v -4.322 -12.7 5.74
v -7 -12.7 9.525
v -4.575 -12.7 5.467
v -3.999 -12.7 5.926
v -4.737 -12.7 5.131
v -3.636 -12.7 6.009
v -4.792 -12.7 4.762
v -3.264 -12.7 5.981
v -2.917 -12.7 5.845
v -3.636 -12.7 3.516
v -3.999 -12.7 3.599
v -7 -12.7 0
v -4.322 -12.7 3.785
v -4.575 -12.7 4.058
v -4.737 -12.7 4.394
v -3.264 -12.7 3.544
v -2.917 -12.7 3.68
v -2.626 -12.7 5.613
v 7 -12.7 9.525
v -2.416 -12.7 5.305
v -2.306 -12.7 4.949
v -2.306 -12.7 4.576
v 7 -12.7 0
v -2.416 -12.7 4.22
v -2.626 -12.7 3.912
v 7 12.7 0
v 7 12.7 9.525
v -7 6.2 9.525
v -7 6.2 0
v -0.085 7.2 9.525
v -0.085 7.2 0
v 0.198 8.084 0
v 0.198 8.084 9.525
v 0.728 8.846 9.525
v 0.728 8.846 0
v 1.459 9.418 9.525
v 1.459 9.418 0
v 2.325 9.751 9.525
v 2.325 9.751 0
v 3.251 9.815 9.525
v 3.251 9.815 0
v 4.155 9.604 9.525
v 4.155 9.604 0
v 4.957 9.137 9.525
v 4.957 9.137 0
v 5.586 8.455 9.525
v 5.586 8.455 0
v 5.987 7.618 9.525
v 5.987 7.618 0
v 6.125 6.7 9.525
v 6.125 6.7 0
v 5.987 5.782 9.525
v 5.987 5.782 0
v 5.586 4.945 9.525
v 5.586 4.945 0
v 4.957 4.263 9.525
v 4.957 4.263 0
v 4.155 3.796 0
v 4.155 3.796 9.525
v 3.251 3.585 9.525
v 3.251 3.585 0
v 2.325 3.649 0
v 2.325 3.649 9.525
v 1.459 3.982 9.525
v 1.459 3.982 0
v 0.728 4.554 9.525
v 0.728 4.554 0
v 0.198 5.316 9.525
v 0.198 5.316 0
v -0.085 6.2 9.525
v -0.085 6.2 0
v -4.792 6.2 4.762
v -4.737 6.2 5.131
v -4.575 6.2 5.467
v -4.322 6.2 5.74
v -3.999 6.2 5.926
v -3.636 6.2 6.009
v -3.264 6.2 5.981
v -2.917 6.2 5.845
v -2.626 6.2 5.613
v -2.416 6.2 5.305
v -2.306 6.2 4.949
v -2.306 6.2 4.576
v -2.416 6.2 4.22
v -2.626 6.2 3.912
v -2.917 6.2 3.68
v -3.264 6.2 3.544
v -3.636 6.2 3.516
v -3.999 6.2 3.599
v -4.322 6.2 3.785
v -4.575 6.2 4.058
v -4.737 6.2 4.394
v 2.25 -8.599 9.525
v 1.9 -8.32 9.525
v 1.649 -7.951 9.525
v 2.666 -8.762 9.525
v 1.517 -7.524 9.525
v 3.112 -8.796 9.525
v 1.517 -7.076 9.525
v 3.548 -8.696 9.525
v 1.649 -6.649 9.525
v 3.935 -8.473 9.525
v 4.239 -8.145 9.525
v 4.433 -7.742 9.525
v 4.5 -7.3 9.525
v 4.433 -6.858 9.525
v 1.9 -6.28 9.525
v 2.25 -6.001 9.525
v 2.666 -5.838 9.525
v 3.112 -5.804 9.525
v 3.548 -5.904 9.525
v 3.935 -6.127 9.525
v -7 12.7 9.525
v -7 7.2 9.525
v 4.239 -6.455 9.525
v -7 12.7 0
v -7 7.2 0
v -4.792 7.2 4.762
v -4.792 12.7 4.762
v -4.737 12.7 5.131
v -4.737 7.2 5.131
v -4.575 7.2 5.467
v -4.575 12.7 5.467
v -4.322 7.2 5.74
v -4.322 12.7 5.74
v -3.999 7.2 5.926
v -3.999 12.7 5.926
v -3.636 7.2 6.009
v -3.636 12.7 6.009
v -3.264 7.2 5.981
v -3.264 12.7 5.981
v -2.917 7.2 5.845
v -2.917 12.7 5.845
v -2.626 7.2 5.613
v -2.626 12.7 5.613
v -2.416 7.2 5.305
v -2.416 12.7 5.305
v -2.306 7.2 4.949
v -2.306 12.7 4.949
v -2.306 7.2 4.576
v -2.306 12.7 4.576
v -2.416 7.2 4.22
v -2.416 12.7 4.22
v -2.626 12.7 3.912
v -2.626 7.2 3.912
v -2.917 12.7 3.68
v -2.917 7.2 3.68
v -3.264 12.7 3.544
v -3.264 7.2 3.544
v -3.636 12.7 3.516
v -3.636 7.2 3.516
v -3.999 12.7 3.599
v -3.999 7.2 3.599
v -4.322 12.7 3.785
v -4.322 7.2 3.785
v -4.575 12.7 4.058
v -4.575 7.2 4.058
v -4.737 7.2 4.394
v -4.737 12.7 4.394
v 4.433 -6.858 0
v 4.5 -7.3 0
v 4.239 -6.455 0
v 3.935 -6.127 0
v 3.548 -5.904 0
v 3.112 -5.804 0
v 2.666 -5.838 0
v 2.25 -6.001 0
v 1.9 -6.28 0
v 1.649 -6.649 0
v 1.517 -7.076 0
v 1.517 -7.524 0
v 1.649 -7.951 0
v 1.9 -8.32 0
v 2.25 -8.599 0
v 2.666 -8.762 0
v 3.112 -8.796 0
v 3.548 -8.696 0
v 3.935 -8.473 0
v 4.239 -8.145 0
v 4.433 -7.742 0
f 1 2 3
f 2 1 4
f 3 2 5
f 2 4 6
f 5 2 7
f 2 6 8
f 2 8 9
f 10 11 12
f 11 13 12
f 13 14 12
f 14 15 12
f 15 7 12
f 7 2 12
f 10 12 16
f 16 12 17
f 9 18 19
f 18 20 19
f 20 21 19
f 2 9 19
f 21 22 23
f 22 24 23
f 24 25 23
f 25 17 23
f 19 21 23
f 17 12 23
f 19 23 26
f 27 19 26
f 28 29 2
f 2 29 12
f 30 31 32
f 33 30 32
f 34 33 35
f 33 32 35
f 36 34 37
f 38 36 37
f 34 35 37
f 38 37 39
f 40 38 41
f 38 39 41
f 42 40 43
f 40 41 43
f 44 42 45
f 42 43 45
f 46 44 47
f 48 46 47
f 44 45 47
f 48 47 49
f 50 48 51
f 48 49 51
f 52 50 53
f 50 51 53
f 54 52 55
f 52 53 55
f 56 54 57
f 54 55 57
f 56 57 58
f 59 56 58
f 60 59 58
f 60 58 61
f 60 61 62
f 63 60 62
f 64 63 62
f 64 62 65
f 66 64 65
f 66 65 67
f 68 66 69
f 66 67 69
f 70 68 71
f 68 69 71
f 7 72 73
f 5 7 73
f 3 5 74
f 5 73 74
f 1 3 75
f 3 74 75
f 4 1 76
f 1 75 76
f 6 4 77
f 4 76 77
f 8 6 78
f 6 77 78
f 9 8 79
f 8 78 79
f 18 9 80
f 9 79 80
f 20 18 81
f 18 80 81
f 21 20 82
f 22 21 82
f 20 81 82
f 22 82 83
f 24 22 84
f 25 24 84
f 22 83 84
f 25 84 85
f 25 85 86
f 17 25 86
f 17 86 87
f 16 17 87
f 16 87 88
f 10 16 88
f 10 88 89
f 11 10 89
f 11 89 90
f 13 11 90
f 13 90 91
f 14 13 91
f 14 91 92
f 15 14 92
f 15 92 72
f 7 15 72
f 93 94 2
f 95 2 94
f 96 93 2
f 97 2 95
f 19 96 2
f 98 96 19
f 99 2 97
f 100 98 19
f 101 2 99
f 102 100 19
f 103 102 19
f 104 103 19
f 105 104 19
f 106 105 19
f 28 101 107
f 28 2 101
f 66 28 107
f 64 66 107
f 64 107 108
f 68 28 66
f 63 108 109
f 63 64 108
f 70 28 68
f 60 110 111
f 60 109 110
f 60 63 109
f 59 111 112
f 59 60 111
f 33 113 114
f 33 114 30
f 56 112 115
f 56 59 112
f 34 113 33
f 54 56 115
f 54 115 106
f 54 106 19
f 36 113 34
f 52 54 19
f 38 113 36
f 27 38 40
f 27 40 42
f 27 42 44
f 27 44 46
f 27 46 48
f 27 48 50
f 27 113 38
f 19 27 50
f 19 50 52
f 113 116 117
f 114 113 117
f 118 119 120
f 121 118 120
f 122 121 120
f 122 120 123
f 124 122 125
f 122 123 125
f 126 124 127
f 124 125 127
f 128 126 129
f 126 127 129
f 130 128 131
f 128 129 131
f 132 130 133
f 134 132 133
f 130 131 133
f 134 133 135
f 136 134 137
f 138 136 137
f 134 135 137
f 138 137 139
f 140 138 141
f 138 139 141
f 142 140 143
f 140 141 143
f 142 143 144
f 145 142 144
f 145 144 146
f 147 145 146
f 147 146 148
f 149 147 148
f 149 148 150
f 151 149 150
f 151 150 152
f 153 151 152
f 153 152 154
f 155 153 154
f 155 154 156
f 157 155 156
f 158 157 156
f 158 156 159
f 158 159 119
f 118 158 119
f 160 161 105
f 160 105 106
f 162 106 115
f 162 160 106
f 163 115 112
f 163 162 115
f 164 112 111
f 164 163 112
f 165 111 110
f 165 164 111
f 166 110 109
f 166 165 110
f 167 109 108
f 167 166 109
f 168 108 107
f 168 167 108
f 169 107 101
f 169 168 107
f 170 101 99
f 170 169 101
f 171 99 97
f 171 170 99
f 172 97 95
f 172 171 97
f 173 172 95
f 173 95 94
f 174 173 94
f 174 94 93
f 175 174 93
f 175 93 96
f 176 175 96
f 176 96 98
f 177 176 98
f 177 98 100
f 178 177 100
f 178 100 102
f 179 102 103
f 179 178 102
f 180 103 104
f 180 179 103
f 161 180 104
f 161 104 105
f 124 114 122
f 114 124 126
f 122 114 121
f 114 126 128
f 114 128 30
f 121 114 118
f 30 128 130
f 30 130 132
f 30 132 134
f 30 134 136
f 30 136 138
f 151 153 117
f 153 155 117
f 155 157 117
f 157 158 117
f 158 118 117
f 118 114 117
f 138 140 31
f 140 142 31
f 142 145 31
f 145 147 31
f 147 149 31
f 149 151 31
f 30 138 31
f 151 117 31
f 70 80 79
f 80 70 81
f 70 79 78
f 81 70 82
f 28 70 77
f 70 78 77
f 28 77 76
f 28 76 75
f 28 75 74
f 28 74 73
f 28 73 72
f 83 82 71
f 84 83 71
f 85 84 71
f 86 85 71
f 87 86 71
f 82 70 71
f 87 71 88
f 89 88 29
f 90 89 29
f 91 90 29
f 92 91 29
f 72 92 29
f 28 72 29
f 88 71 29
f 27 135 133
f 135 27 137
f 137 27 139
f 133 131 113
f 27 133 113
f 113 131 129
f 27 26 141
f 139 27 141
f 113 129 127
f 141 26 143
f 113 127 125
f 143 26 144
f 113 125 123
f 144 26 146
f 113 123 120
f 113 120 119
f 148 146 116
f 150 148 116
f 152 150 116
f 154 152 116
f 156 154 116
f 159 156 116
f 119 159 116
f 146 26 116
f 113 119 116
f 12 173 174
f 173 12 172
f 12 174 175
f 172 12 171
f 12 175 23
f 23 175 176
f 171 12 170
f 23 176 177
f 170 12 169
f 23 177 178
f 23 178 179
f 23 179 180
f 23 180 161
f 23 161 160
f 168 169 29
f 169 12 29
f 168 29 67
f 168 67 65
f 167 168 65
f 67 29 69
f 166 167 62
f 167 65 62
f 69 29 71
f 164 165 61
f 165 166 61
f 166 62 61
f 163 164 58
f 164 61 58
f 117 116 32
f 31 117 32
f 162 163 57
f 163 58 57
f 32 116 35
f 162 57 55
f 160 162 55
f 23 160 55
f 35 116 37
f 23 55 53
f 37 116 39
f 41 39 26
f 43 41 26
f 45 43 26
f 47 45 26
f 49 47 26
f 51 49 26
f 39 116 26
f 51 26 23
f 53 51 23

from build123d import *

# Parameters (mm, degrees)
F0_R     = 1.5
F1_DEPTH = 9.525
F2_R     = 1.25
F3_DEPTH = 25.401


# Not quite as in the source:
# - a length typed as a fraction of an inch, garbled in the dataset ("3 / 203.2 mm" for 3/8 in), is restored


with BuildPart() as f1:
    # F0 (on Top) → F1 (new body)
    with BuildSketch(Plane.XY):
        with BuildLine():
            Line((-7, -12.7), (7, -12.7))
            Line((7, -12.7), (7, 12.7))
            Line((7, 12.7), (-7, 12.7))
            Line((-7, 12.7), (-7, 7.2))
            Line((-7, 7.2), (-0.0847406698, 7.2))
            ThreePointArc((-0.0847406698, 7.2), (6.125, 6.7), (-0.0847406698, 6.2))
            Line((-0.0847406698, 6.2), (-7, 6.2))
            Line((-7, 6.2), (-7, -12.7))
        make_face()
        with Locations((3, -7.3)):
            Circle(F0_R, mode=Mode.SUBTRACT)
    extrude(amount=F1_DEPTH)

    # F2 (on face) → F3 (cut, through all)
    with BuildSketch(Plane(origin=(0, 12.7, 0), x_dir=(-1, 0, 0), z_dir=(0, 1, 0))):
        with Locations((3.5423703349, 4.7625)):
            Circle(F2_R)
    extrude(amount=-F3_DEPTH, mode=Mode.SUBTRACT)


solid = f1.part
